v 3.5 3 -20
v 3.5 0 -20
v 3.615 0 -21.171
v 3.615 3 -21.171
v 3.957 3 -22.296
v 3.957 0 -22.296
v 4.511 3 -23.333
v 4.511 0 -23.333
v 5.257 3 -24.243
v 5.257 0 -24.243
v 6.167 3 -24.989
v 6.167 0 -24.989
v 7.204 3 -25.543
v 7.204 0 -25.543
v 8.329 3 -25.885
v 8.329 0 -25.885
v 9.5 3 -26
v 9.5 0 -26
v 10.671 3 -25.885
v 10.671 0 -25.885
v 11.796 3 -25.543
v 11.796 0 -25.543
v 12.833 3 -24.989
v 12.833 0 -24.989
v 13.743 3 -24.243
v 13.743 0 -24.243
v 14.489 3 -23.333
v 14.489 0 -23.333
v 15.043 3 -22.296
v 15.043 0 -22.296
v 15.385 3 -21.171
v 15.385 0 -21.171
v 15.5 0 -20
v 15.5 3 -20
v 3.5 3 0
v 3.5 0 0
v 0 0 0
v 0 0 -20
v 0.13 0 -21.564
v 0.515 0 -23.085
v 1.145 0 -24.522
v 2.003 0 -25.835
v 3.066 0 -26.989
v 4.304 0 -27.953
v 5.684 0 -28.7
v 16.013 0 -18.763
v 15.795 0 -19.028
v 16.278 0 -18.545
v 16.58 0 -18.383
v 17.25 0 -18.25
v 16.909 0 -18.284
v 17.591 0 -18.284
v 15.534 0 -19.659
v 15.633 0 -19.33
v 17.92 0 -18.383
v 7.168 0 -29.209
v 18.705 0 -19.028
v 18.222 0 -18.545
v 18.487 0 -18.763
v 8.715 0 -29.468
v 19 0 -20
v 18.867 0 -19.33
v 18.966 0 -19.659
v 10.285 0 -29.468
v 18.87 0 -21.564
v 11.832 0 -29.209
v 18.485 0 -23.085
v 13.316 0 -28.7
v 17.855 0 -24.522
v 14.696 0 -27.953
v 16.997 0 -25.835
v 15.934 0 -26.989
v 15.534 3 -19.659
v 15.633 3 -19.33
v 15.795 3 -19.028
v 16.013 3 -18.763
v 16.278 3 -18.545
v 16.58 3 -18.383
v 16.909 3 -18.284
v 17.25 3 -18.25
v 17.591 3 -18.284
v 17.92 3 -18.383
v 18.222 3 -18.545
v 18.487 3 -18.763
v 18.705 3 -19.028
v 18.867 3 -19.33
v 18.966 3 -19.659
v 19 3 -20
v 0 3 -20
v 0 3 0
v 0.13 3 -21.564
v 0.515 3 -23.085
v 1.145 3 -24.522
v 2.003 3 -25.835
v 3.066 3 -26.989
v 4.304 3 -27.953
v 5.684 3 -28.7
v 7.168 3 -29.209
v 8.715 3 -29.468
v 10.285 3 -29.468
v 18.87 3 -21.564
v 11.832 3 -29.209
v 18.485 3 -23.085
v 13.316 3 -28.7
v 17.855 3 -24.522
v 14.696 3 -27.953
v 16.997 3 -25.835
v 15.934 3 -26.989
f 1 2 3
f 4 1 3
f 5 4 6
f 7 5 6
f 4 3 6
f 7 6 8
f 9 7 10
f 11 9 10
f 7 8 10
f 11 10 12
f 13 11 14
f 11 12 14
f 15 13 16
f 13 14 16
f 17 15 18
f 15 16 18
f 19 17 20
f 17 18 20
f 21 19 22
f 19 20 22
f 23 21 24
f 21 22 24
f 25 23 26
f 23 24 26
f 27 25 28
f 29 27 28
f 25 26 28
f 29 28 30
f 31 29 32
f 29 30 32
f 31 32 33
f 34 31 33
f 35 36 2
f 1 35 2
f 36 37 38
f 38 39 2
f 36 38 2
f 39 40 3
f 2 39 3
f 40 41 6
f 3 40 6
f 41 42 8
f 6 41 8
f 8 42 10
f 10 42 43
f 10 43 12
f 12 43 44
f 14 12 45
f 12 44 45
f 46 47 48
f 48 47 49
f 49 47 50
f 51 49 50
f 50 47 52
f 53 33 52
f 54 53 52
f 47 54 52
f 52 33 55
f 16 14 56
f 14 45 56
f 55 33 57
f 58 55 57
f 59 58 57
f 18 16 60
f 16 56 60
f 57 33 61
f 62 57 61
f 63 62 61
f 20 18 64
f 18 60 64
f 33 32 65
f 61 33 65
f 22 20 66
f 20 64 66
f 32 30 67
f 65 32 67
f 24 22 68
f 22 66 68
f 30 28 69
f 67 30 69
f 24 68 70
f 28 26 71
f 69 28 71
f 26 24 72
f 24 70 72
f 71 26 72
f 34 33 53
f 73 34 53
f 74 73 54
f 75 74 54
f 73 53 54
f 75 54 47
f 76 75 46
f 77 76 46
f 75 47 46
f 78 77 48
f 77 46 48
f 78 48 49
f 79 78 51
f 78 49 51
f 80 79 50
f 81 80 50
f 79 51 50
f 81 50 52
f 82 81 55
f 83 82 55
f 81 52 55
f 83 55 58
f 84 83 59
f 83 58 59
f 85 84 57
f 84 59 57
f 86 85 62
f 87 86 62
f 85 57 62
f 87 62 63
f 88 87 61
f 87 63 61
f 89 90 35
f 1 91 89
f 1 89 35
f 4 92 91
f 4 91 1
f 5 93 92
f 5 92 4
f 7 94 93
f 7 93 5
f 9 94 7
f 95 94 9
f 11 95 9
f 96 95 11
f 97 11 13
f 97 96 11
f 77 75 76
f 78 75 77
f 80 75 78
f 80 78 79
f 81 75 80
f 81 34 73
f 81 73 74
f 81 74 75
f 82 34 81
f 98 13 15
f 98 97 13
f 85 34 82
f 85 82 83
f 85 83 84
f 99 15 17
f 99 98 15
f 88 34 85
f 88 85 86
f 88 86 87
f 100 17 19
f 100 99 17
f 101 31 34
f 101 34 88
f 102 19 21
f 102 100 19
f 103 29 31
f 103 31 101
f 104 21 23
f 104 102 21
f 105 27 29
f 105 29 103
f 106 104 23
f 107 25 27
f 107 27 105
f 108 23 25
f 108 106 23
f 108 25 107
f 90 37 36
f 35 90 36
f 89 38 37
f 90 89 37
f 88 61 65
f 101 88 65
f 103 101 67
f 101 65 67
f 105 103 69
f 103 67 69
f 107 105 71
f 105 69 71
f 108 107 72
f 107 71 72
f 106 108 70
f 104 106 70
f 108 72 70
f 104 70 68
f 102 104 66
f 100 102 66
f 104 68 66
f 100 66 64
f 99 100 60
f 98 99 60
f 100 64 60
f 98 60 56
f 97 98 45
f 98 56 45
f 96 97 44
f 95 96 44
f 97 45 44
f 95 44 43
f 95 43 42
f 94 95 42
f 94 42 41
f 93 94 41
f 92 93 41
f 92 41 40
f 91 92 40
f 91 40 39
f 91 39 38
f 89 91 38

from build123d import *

# Parameters (mm, degrees)
BOSS_EXTRUDE1_DEPTH = 3


with BuildPart() as part:
    # Sketch1 → Boss-Extrude1 (new body)
    with BuildSketch(Plane(origin=(0, 0, 0), x_dir=(1, 0, 0), z_dir=(0, 1, 0))):
        with BuildLine():
            Line((0, 0), (3.5, 0))
            Line((3.5, 0), (3.5, 20))
            ThreePointArc((3.5, 20), (9.5, 26), (15.5, 20))
            ThreePointArc((15.5, 20), (17.25, 18.25), (19, 20))
            ThreePointArc((19, 20), (9.5, 29.5), (0, 20))
            Line((0, 20), (0, 0))
        make_face()
    extrude(amount=BOSS_EXTRUDE1_DEPTH)


solid = part.part
